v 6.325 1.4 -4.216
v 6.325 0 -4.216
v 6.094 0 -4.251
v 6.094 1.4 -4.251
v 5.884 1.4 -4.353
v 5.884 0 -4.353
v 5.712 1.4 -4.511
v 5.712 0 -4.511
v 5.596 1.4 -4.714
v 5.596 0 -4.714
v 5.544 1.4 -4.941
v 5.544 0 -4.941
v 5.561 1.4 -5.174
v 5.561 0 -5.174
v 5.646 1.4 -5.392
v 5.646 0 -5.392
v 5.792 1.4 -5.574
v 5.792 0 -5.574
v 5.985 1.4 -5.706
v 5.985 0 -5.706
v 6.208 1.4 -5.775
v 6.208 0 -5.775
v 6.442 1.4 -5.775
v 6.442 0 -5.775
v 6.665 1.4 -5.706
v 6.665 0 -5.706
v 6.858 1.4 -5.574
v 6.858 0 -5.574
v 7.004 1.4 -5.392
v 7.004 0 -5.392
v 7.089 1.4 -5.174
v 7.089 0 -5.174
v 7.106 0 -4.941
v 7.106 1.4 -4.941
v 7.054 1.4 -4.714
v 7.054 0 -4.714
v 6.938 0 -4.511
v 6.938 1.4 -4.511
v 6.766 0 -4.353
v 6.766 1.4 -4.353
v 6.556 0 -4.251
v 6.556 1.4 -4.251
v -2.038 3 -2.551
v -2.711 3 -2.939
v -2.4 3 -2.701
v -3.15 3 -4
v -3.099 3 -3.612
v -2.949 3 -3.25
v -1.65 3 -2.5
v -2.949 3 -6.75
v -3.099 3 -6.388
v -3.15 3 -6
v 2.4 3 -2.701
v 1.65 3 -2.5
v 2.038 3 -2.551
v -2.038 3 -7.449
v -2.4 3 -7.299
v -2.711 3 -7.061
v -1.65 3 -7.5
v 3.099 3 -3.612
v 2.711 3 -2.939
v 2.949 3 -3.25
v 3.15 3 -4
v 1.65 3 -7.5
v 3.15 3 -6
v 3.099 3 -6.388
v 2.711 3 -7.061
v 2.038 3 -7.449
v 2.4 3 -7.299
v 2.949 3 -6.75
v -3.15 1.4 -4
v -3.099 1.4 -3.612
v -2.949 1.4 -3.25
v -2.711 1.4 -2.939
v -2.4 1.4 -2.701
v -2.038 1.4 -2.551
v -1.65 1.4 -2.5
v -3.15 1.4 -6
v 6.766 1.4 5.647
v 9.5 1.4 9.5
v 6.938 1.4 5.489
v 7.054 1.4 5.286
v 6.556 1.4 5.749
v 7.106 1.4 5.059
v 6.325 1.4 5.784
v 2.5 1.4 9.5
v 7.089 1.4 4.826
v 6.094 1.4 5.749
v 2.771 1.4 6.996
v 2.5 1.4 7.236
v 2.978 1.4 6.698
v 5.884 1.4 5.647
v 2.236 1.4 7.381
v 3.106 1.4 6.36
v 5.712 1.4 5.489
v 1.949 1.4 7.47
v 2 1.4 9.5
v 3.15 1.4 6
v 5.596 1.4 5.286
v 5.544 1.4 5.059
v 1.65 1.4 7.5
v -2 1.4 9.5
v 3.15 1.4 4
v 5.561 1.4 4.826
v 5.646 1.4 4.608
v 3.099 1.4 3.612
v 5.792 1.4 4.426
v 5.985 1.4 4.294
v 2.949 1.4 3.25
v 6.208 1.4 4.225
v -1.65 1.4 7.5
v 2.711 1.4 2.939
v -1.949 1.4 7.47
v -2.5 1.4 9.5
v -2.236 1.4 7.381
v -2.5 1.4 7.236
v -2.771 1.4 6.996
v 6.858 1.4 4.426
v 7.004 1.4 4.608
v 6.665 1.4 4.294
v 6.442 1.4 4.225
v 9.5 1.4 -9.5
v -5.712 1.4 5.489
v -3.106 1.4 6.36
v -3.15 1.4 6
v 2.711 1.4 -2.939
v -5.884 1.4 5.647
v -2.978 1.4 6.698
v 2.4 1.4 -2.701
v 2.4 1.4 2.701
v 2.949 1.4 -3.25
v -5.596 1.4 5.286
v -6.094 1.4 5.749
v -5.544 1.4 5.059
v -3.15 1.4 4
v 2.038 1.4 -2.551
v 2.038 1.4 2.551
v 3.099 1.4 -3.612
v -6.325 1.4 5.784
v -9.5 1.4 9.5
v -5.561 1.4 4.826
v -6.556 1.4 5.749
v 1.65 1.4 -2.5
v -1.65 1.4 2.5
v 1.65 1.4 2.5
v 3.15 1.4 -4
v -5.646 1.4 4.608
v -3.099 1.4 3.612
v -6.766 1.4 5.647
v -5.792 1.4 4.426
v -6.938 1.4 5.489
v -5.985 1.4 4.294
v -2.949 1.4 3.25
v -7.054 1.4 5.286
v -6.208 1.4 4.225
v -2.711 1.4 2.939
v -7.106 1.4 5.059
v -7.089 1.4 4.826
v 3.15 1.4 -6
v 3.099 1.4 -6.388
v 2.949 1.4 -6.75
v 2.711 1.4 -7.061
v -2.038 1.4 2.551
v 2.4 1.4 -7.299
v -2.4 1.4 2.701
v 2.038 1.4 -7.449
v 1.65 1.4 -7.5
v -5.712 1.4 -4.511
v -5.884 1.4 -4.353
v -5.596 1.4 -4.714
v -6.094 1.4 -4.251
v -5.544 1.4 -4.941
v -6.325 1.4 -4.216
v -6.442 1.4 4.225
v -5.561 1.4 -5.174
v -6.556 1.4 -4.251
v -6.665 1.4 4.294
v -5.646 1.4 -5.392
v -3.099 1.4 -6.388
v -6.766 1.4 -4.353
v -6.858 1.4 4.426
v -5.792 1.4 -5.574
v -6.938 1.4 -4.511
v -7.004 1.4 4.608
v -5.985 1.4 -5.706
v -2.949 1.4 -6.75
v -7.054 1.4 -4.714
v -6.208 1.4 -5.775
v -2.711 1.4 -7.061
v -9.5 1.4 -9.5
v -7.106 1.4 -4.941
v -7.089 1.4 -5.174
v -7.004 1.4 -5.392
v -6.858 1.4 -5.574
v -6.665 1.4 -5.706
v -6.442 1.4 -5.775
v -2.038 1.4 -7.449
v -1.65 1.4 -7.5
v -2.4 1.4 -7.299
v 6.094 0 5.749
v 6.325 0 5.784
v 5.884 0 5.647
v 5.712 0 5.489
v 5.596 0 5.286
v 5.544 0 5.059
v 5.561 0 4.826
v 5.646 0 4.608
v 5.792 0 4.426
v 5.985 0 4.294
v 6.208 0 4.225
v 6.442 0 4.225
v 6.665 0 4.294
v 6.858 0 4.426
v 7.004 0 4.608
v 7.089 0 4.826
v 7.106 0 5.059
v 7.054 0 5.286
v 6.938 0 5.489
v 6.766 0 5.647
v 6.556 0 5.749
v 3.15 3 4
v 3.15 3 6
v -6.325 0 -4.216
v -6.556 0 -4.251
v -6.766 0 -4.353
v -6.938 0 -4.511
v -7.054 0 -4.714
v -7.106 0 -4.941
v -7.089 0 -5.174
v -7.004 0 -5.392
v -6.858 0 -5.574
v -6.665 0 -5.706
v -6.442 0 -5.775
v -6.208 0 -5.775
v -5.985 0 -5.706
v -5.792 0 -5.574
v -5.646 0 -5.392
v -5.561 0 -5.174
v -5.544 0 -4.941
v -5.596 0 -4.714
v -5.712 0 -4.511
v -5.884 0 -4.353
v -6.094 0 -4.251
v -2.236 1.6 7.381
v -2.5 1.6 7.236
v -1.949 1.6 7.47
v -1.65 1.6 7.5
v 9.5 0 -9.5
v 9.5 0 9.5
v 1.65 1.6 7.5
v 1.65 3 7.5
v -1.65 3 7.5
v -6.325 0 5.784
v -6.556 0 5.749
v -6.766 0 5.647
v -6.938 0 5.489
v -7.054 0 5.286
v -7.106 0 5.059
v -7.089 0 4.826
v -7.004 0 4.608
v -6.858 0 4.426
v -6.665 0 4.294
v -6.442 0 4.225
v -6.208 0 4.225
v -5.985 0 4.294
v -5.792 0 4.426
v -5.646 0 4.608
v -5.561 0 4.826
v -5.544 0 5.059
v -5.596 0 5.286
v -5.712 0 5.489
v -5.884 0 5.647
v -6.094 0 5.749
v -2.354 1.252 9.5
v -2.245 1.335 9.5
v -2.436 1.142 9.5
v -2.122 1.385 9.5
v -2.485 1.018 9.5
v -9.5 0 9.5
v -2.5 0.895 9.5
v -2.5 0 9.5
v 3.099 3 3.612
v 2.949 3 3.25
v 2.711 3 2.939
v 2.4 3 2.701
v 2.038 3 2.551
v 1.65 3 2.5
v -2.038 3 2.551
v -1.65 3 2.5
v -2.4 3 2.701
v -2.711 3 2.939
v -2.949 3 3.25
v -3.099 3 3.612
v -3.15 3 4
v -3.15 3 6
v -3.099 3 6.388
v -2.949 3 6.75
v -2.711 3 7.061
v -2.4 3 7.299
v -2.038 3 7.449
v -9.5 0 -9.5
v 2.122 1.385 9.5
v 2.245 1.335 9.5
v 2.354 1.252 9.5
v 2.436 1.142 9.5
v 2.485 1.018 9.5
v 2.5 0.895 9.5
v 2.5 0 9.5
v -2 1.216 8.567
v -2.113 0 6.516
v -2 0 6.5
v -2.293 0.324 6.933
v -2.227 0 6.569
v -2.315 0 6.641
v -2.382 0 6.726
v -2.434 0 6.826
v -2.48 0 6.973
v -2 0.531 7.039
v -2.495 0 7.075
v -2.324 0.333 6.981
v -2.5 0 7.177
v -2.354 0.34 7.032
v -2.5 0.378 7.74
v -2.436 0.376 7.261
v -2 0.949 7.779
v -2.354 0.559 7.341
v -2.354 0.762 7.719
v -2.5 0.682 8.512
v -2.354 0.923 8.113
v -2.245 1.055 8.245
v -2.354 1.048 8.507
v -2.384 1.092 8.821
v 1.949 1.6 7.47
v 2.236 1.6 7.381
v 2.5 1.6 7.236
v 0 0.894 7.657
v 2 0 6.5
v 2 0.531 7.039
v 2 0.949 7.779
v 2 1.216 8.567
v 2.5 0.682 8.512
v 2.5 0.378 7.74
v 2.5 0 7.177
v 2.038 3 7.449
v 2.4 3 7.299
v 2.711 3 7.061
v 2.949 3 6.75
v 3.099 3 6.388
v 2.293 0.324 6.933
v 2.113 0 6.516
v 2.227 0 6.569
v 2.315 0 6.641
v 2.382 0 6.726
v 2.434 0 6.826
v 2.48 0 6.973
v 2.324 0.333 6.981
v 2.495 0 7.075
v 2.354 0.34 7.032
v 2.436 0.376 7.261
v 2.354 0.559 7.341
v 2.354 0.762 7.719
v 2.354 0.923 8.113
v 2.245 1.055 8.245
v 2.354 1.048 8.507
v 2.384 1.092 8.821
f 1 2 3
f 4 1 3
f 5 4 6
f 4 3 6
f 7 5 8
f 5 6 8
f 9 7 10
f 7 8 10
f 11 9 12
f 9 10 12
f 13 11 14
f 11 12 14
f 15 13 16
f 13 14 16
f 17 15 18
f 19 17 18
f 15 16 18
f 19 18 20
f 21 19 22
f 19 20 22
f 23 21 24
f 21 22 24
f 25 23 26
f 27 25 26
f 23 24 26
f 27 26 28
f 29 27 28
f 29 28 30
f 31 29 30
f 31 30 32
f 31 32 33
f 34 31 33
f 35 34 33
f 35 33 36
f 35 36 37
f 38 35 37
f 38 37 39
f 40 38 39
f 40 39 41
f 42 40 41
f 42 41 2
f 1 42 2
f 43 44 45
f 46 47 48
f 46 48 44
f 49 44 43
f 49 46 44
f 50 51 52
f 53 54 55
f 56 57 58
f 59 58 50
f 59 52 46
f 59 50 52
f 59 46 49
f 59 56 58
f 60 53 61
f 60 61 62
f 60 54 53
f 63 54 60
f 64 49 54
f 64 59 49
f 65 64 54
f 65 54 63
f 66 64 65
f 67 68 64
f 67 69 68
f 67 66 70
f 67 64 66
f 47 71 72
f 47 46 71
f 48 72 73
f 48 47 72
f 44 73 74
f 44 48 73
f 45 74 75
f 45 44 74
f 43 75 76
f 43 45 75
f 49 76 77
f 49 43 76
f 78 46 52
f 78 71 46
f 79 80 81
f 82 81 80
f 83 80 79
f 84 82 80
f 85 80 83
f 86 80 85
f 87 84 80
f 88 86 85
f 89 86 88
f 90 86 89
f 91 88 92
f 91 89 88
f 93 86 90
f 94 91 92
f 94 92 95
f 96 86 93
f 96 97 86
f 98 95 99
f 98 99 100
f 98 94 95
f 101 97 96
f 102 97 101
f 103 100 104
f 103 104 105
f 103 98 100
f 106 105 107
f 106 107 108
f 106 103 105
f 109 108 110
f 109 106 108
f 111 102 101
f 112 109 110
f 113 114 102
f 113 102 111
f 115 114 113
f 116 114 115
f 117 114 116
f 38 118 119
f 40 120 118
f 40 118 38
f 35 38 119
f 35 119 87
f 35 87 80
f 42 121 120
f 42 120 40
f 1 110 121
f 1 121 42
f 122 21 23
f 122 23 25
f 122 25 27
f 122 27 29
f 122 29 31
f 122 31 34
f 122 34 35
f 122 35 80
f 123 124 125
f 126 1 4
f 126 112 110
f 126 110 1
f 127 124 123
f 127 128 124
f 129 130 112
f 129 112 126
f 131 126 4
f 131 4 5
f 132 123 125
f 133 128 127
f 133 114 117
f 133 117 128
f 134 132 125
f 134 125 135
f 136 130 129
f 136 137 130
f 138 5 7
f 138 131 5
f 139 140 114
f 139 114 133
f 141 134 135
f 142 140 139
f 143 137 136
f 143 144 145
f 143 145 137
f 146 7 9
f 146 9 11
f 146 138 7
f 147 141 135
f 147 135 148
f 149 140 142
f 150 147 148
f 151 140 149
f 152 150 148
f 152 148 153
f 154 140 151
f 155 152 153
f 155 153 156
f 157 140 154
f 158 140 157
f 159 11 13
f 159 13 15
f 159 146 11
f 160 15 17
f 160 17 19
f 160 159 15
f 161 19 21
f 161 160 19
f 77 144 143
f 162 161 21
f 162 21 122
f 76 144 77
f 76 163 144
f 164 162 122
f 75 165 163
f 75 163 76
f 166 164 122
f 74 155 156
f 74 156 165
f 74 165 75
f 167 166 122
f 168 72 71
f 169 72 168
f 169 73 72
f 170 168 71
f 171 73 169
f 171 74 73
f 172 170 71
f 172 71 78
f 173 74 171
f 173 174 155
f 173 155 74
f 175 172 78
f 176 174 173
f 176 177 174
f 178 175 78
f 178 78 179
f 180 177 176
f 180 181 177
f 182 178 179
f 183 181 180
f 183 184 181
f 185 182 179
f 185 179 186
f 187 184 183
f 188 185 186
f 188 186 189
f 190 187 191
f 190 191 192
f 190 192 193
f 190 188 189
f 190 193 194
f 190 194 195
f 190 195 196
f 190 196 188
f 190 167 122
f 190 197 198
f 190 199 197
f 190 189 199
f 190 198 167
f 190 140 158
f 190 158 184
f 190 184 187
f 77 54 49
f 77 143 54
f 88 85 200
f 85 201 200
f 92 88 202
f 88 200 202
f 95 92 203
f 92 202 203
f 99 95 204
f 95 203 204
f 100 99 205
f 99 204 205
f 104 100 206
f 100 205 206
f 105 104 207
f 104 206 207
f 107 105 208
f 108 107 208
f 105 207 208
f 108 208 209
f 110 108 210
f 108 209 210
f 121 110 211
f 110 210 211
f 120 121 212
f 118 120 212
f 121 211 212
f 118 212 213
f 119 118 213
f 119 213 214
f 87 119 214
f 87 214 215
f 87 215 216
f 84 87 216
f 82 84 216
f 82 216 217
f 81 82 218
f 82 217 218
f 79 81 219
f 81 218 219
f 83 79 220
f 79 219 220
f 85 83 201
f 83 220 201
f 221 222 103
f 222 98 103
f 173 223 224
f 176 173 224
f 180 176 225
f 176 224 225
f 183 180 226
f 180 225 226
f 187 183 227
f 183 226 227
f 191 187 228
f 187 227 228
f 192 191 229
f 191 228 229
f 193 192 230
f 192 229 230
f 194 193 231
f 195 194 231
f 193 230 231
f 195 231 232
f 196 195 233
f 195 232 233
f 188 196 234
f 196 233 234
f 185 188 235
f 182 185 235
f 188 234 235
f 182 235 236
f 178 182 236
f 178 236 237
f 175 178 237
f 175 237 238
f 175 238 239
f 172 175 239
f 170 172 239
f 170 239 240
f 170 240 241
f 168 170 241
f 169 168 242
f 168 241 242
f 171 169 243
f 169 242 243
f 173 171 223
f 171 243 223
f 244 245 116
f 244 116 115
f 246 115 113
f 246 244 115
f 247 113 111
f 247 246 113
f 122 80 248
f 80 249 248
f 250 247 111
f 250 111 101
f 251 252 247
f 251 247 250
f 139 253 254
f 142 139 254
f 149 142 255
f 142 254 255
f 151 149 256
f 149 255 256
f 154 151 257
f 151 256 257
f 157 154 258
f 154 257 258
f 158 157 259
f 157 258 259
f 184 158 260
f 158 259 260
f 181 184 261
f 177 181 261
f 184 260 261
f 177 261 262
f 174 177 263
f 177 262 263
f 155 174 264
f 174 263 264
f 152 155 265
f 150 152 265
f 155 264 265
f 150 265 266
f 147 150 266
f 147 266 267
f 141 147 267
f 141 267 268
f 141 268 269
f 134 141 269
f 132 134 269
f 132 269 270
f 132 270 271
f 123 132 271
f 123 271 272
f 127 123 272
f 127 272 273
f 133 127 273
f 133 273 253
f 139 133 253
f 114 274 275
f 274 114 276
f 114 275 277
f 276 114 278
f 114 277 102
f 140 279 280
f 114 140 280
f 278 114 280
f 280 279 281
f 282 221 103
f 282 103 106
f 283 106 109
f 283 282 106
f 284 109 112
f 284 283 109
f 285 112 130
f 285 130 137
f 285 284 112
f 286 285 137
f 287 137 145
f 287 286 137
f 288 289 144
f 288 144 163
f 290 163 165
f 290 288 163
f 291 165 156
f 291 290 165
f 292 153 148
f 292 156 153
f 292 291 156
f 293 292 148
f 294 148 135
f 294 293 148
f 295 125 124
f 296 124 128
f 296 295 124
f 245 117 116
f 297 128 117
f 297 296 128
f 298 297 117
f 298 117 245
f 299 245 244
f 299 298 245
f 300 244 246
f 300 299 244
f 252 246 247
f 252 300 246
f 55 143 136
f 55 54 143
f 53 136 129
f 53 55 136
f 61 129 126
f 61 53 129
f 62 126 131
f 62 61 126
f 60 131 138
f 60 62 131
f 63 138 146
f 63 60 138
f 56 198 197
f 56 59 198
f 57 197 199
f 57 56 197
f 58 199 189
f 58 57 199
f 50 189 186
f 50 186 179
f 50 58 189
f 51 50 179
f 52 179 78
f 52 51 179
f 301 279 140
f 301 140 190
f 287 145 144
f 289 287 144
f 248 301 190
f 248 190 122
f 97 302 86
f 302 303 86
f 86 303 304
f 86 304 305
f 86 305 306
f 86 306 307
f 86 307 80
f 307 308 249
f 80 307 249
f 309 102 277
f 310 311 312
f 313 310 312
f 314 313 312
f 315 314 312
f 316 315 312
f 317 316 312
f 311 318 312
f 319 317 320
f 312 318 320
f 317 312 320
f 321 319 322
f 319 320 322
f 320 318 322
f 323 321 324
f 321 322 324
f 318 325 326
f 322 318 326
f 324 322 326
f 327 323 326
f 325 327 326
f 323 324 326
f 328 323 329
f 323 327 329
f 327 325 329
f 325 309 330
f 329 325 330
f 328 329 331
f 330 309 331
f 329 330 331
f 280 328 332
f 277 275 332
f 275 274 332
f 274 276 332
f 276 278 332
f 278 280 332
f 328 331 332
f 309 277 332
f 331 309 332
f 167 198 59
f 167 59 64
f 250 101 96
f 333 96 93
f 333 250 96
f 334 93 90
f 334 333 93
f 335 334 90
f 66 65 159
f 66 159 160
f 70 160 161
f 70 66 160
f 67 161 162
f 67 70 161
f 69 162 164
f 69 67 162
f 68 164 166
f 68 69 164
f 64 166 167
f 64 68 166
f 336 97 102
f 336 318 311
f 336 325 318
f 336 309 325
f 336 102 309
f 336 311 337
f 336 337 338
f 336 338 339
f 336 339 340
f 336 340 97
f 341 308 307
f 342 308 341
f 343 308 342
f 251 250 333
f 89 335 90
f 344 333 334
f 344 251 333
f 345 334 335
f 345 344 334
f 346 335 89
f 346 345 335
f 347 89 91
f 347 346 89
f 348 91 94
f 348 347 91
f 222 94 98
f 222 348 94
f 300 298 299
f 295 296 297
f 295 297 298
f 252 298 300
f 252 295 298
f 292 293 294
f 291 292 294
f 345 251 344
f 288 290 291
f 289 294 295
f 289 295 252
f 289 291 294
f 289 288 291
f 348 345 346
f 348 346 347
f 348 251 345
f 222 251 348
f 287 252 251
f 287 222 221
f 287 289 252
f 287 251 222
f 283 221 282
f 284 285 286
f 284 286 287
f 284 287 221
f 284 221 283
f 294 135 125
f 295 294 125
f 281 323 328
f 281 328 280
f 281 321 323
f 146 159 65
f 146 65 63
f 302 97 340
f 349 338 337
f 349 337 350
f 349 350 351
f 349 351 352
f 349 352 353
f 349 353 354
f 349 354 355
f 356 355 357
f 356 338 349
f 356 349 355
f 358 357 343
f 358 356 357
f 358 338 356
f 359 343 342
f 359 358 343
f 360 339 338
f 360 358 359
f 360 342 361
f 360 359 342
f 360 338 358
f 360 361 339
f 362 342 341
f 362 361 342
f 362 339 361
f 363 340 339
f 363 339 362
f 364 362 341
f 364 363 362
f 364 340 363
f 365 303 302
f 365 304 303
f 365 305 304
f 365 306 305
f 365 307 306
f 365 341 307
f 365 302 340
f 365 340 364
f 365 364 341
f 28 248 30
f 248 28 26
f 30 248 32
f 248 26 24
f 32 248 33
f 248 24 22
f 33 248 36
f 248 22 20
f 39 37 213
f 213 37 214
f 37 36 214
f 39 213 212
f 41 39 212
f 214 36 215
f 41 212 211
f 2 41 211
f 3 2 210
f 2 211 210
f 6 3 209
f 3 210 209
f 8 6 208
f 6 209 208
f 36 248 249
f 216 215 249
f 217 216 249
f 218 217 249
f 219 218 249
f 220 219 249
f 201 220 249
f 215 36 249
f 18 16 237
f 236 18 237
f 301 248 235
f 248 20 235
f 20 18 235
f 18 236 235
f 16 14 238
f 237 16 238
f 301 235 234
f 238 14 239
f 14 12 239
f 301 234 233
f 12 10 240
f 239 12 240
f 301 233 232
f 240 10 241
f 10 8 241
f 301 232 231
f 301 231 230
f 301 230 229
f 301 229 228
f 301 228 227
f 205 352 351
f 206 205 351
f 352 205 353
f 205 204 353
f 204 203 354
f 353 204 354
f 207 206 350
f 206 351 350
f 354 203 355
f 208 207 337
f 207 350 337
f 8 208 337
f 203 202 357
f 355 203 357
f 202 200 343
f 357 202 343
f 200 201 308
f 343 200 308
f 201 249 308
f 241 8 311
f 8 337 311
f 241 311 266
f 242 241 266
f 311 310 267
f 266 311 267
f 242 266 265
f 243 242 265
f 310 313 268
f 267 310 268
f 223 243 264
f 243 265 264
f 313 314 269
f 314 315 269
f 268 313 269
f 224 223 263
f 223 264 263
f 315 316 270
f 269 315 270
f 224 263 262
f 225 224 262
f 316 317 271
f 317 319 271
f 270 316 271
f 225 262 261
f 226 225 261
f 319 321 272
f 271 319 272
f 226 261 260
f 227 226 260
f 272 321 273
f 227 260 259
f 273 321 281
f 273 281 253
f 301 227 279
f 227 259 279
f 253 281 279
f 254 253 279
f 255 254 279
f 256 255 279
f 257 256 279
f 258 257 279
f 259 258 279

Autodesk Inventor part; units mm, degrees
ref_plane "YZ Plane" through (0, 0, 0) normal (1, 0, 0) x (0, 1, 0)
ref_plane "XZ Plane" through (0, 0, 0) normal (0, 1, 0) x (-1, 0, 0)
ref_plane "XY Plane" through (0, 0, 0) normal (0, 0, 1) x (1, 0, 0)
sketch "スケッチ1" plane through (0, 0, 0) normal (0, 1, 0) x (-1, 0, 0)
  line L0 (9.5, -9.5) -> (0, -9.5)
  line L1 (0, -9.5) -> (0, -2.5)
  line L2 (0, 0) -> (3.15, 0)
  line L3 (9.5, 0) -> (9.5, -9.5)
  line L4 (0, 0) -> (3.15, 0)
  line L5 (3.15, 0) -> (3.15, -1)
  line L6 (1.65, -2.5) -> (0, -2.5)
  line L7 (0, -2.5) -> (0, 0)
  arc A0 (1.65, -2.5) -> (3.15, -1) centre (1.65, -1) ccw
  line L8 (3.15, 0) -> (6.325, 0)
  line L9 (6.325, 0) -> (9.5, 0)
  line L10 (0, -2.5) -> (0, 0)
  line L11 (9.5, 9.5) -> (0, 9.5)
  line L12 (9.5, 0) -> (9.5, 9.5)
  line L13 (3.15, 0) -> (3.15, 1)
  line L14 (1.65, 2.5) -> (0, 2.5)
  arc A1 (3.15, 1) -> (1.65, 2.5) centre (1.65, 1) ccw
  line L15 (-9.5, -9.5) -> (0, -9.5)
  line L16 (-9.5, 0) -> (-9.5, -9.5)
  line L17 (-3.15, 0) -> (-3.15, -1)
  line L18 (-1.65, -2.5) -> (0, -2.5)
  arc A2 (-3.15, -1) -> (-1.65, -2.5) centre (-1.65, -1) ccw
  line L19 (-9.5, 9.5) -> (0, 9.5)
  line L20 (-9.5, 0) -> (-9.5, 9.5)
  line L21 (-3.15, 0) -> (-3.15, 1)
  arc A3 (-1.65, 2.5) -> (-3.15, 1) centre (-1.65, 1) ccw
  line L22 (-1.65, 2.5) -> (0, 2.5)
  point P0 (-6.325, 0)
  dimension "d2" = 1.5
  dimension "d3" = 19
  dimension "d4" = 6.3
  dimension "d5" = 5
  dimension "d6" = 19
extrude "押し出し1" add sketch "スケッチ1" along normal blind 1.4
sketch "スケッチ2" plane through (0, 1.4, 0) normal (0, 1, 0) x (1, 0, 0)
  line L0 (9.5, 9.5) -> (-9.5, 9.5) projected
  line L1 (0, 9.5) -> (0, 7.5)
  line L2 (0, 7.5) -> (0, 2.5)
  line L3 (0, 2.5) -> (0, 0)
  line L4 (-3.15, 7.5) -> (3.15, 7.5)
  line L5 (3.15, 7.5) -> (3.15, 2.5)
  line L6 (3.15, 2.5) -> (-3.15, 2.5)
  line L7 (-3.15, 2.5) -> (-3.15, 7.5)
  line L8 (-9.5, 9.5) -> (-9.5, -9.5) projected
  line L9 (-9.5, 0) -> (9.5, 0)
  line L10 (9.5, -9.5) -> (9.5, 9.5) projected
  line L11 (-3.15, -7.5) -> (3.15, -7.5)
  line L12 (3.15, -7.5) -> (3.15, -2.5)
  line L13 (3.15, -2.5) -> (-3.15, -2.5)
  line L14 (-3.15, -2.5) -> (-3.15, -7.5)
  dimension "d11" = 6.3
  dimension "d12" = 2.5
  dimension "d13" = 5
extrude "押し出し2" add sketch "スケッチ2" along normal blind 1.6 contours L4 L5 L6 L2 | L2 L6 L7 L4 | L14 L13 L12 L11
fillet "フィレット1" radius 1.5 8 edges at (-3.15, 2.2, -2.5) (-3.15, 2.2, 7.5) (3.15, 2.2, 7.5) (3.15, 2.2, 2.5) (-3.15, 2.2, 2.5) (3.15, 2.2, -2.5) (3.15, 2.2, -7.5) (-3.15, 2.2, -7.5)
sketch "スケッチ3" plane through (0, 1.4, 0) normal (0, 1, 0) x (1, 0, 0)
  arc A0 (-1.65, 7.5) -> (-3.15, 6) centre (-1.65, 6) ccw projected
  line L0 (-3.15, 6) -> (-3.15, 4) projected
  arc A1 (-3.15, 4) -> (-1.65, 2.5) centre (-1.65, 4) ccw projected
  line L1 (-1.65, 2.5) -> (1.65, 2.5) projected
  arc A2 (1.65, 2.5) -> (3.15, 4) centre (1.65, 4) ccw projected
  line L2 (3.15, 4) -> (3.15, 6) projected
  arc A3 (3.15, 6) -> (1.65, 7.5) centre (1.65, 6) ccw projected
  line L3 (1.65, 7.5) -> (-1.65, 7.5) projected
  arc A4 (-1.65, -2.5) -> (-3.15, -4) centre (-1.65, -4) ccw projected
  line L4 (-3.15, -4) -> (-3.15, -6) projected
  arc A5 (-3.15, -6) -> (-1.65, -7.5) centre (-1.65, -6) ccw projected
  line L5 (-1.65, -7.5) -> (1.65, -7.5) projected
  arc A6 (1.65, -7.5) -> (3.15, -6) centre (1.65, -6) ccw projected
  line L6 (3.15, -6) -> (3.15, -4) projected
  arc A7 (3.15, -4) -> (1.65, -2.5) centre (1.65, -4) ccw projected
  line L7 (1.65, -2.5) -> (-1.65, -2.5) projected
  line L8 (-3.15, 5) -> (-9.5, 5)
  line L9 (-9.5, 9.5) -> (-9.5, -9.5) projected
  line L10 (-9.5, 0) -> (0, 0)
  line L11 (0, 0) -> (0, 9.5)
  line L12 (9.5, 9.5) -> (-9.5, 9.5) projected
  point P0 (-6.325, 5)
  point P1 (-6.325, -5)
  point P2 (6.325, 5)
  point P3 (6.325, -5)
hole "穴1" at (-6.325, 1.4, -5) at (-6.325, 1.4, 5) at (6.325, 1.4, -5) at (6.325, 1.4, 5) direction (0, -1, 0) diameter 1.567 end through all thread size "M2x0.4" class "6H" standard "ISO Metric profile"
sketch "スケッチ4" plane through (0, 0, 0) normal (0, -1, 0) x (1, 0, 0)
  line L0 (-2.5, 9.5) -> (2.5, 9.5)
  line L1 (2.5, 9.5) -> (2.5, 6.5)
  line L2 (2.5, 6.5) -> (-2.5, 6.5)
  line L3 (-2.5, 6.5) -> (-2.5, 9.5)
  line L4 (-9.5, 9.5) -> (9.5, 9.5) projected
  point P0 (0, 0)
  point P1 (0, 9.5)
  dimension "d24" = 5
  dimension "d25" = 3
extrude "押し出し3" cut sketch "スケッチ4" against normal blind 1.6
sketch "スケッチ5" plane through (-2.5, 0, 9.5) normal (1, 0, 0) x (0, 0, -1)
  line L0 (2.2641, 1.4) -> (2.2641, 1.6) projected
  line L1 (0, 1.4) -> (2.2641, 1.4) projected
  line L2 (0, 0) -> (0, 1.4) projected
  line L3 (3, 0) -> (0, 0) projected
  line L4 (3, 0) -> (3, 1.6) projected
  line L5 (3, 1.6) -> (2.2641, 1.6) projected
  spline S0 degree 2 poles (3, 0) (2.1867, 1.089) (0, 1.4) knots 0 0 0 1 1 1
  point P0 (9.5, 0)
  point P1 (2.0329, 0.8)
extrude "押し出し4" add sketch "スケッチ5" along normal up to surface (5 mm away) contours L0 L5 L4 S0 L1
sketch "スケッチ6" plane through (0, 1.6, 0) normal (0, -1, 0) x (1, 0, 0)
  line L0 (-2.5, 7.2359) -> (2.5, 7.2359) projected
  arc A0 (2.5, 7.2359) -> (1.65, 7.5) centre (1.65, 6) ccw projected
  line L1 (-1.65, 7.5) -> (1.65, 7.5) projected
  arc A1 (-1.65, 7.5) -> (-2.5, 7.2359) centre (-1.65, 6) ccw projected
  point P0 (0, 0)
extrude "押し出し5" add sketch "スケッチ6" along normal up to surface (0.2 mm away)
fillet "フィレット2" radius 0.5 2 edges at (-2.5, 0.8945, 7.6566) (2.5, 0.8945, 7.6566)
properties part number "sensorbar"
